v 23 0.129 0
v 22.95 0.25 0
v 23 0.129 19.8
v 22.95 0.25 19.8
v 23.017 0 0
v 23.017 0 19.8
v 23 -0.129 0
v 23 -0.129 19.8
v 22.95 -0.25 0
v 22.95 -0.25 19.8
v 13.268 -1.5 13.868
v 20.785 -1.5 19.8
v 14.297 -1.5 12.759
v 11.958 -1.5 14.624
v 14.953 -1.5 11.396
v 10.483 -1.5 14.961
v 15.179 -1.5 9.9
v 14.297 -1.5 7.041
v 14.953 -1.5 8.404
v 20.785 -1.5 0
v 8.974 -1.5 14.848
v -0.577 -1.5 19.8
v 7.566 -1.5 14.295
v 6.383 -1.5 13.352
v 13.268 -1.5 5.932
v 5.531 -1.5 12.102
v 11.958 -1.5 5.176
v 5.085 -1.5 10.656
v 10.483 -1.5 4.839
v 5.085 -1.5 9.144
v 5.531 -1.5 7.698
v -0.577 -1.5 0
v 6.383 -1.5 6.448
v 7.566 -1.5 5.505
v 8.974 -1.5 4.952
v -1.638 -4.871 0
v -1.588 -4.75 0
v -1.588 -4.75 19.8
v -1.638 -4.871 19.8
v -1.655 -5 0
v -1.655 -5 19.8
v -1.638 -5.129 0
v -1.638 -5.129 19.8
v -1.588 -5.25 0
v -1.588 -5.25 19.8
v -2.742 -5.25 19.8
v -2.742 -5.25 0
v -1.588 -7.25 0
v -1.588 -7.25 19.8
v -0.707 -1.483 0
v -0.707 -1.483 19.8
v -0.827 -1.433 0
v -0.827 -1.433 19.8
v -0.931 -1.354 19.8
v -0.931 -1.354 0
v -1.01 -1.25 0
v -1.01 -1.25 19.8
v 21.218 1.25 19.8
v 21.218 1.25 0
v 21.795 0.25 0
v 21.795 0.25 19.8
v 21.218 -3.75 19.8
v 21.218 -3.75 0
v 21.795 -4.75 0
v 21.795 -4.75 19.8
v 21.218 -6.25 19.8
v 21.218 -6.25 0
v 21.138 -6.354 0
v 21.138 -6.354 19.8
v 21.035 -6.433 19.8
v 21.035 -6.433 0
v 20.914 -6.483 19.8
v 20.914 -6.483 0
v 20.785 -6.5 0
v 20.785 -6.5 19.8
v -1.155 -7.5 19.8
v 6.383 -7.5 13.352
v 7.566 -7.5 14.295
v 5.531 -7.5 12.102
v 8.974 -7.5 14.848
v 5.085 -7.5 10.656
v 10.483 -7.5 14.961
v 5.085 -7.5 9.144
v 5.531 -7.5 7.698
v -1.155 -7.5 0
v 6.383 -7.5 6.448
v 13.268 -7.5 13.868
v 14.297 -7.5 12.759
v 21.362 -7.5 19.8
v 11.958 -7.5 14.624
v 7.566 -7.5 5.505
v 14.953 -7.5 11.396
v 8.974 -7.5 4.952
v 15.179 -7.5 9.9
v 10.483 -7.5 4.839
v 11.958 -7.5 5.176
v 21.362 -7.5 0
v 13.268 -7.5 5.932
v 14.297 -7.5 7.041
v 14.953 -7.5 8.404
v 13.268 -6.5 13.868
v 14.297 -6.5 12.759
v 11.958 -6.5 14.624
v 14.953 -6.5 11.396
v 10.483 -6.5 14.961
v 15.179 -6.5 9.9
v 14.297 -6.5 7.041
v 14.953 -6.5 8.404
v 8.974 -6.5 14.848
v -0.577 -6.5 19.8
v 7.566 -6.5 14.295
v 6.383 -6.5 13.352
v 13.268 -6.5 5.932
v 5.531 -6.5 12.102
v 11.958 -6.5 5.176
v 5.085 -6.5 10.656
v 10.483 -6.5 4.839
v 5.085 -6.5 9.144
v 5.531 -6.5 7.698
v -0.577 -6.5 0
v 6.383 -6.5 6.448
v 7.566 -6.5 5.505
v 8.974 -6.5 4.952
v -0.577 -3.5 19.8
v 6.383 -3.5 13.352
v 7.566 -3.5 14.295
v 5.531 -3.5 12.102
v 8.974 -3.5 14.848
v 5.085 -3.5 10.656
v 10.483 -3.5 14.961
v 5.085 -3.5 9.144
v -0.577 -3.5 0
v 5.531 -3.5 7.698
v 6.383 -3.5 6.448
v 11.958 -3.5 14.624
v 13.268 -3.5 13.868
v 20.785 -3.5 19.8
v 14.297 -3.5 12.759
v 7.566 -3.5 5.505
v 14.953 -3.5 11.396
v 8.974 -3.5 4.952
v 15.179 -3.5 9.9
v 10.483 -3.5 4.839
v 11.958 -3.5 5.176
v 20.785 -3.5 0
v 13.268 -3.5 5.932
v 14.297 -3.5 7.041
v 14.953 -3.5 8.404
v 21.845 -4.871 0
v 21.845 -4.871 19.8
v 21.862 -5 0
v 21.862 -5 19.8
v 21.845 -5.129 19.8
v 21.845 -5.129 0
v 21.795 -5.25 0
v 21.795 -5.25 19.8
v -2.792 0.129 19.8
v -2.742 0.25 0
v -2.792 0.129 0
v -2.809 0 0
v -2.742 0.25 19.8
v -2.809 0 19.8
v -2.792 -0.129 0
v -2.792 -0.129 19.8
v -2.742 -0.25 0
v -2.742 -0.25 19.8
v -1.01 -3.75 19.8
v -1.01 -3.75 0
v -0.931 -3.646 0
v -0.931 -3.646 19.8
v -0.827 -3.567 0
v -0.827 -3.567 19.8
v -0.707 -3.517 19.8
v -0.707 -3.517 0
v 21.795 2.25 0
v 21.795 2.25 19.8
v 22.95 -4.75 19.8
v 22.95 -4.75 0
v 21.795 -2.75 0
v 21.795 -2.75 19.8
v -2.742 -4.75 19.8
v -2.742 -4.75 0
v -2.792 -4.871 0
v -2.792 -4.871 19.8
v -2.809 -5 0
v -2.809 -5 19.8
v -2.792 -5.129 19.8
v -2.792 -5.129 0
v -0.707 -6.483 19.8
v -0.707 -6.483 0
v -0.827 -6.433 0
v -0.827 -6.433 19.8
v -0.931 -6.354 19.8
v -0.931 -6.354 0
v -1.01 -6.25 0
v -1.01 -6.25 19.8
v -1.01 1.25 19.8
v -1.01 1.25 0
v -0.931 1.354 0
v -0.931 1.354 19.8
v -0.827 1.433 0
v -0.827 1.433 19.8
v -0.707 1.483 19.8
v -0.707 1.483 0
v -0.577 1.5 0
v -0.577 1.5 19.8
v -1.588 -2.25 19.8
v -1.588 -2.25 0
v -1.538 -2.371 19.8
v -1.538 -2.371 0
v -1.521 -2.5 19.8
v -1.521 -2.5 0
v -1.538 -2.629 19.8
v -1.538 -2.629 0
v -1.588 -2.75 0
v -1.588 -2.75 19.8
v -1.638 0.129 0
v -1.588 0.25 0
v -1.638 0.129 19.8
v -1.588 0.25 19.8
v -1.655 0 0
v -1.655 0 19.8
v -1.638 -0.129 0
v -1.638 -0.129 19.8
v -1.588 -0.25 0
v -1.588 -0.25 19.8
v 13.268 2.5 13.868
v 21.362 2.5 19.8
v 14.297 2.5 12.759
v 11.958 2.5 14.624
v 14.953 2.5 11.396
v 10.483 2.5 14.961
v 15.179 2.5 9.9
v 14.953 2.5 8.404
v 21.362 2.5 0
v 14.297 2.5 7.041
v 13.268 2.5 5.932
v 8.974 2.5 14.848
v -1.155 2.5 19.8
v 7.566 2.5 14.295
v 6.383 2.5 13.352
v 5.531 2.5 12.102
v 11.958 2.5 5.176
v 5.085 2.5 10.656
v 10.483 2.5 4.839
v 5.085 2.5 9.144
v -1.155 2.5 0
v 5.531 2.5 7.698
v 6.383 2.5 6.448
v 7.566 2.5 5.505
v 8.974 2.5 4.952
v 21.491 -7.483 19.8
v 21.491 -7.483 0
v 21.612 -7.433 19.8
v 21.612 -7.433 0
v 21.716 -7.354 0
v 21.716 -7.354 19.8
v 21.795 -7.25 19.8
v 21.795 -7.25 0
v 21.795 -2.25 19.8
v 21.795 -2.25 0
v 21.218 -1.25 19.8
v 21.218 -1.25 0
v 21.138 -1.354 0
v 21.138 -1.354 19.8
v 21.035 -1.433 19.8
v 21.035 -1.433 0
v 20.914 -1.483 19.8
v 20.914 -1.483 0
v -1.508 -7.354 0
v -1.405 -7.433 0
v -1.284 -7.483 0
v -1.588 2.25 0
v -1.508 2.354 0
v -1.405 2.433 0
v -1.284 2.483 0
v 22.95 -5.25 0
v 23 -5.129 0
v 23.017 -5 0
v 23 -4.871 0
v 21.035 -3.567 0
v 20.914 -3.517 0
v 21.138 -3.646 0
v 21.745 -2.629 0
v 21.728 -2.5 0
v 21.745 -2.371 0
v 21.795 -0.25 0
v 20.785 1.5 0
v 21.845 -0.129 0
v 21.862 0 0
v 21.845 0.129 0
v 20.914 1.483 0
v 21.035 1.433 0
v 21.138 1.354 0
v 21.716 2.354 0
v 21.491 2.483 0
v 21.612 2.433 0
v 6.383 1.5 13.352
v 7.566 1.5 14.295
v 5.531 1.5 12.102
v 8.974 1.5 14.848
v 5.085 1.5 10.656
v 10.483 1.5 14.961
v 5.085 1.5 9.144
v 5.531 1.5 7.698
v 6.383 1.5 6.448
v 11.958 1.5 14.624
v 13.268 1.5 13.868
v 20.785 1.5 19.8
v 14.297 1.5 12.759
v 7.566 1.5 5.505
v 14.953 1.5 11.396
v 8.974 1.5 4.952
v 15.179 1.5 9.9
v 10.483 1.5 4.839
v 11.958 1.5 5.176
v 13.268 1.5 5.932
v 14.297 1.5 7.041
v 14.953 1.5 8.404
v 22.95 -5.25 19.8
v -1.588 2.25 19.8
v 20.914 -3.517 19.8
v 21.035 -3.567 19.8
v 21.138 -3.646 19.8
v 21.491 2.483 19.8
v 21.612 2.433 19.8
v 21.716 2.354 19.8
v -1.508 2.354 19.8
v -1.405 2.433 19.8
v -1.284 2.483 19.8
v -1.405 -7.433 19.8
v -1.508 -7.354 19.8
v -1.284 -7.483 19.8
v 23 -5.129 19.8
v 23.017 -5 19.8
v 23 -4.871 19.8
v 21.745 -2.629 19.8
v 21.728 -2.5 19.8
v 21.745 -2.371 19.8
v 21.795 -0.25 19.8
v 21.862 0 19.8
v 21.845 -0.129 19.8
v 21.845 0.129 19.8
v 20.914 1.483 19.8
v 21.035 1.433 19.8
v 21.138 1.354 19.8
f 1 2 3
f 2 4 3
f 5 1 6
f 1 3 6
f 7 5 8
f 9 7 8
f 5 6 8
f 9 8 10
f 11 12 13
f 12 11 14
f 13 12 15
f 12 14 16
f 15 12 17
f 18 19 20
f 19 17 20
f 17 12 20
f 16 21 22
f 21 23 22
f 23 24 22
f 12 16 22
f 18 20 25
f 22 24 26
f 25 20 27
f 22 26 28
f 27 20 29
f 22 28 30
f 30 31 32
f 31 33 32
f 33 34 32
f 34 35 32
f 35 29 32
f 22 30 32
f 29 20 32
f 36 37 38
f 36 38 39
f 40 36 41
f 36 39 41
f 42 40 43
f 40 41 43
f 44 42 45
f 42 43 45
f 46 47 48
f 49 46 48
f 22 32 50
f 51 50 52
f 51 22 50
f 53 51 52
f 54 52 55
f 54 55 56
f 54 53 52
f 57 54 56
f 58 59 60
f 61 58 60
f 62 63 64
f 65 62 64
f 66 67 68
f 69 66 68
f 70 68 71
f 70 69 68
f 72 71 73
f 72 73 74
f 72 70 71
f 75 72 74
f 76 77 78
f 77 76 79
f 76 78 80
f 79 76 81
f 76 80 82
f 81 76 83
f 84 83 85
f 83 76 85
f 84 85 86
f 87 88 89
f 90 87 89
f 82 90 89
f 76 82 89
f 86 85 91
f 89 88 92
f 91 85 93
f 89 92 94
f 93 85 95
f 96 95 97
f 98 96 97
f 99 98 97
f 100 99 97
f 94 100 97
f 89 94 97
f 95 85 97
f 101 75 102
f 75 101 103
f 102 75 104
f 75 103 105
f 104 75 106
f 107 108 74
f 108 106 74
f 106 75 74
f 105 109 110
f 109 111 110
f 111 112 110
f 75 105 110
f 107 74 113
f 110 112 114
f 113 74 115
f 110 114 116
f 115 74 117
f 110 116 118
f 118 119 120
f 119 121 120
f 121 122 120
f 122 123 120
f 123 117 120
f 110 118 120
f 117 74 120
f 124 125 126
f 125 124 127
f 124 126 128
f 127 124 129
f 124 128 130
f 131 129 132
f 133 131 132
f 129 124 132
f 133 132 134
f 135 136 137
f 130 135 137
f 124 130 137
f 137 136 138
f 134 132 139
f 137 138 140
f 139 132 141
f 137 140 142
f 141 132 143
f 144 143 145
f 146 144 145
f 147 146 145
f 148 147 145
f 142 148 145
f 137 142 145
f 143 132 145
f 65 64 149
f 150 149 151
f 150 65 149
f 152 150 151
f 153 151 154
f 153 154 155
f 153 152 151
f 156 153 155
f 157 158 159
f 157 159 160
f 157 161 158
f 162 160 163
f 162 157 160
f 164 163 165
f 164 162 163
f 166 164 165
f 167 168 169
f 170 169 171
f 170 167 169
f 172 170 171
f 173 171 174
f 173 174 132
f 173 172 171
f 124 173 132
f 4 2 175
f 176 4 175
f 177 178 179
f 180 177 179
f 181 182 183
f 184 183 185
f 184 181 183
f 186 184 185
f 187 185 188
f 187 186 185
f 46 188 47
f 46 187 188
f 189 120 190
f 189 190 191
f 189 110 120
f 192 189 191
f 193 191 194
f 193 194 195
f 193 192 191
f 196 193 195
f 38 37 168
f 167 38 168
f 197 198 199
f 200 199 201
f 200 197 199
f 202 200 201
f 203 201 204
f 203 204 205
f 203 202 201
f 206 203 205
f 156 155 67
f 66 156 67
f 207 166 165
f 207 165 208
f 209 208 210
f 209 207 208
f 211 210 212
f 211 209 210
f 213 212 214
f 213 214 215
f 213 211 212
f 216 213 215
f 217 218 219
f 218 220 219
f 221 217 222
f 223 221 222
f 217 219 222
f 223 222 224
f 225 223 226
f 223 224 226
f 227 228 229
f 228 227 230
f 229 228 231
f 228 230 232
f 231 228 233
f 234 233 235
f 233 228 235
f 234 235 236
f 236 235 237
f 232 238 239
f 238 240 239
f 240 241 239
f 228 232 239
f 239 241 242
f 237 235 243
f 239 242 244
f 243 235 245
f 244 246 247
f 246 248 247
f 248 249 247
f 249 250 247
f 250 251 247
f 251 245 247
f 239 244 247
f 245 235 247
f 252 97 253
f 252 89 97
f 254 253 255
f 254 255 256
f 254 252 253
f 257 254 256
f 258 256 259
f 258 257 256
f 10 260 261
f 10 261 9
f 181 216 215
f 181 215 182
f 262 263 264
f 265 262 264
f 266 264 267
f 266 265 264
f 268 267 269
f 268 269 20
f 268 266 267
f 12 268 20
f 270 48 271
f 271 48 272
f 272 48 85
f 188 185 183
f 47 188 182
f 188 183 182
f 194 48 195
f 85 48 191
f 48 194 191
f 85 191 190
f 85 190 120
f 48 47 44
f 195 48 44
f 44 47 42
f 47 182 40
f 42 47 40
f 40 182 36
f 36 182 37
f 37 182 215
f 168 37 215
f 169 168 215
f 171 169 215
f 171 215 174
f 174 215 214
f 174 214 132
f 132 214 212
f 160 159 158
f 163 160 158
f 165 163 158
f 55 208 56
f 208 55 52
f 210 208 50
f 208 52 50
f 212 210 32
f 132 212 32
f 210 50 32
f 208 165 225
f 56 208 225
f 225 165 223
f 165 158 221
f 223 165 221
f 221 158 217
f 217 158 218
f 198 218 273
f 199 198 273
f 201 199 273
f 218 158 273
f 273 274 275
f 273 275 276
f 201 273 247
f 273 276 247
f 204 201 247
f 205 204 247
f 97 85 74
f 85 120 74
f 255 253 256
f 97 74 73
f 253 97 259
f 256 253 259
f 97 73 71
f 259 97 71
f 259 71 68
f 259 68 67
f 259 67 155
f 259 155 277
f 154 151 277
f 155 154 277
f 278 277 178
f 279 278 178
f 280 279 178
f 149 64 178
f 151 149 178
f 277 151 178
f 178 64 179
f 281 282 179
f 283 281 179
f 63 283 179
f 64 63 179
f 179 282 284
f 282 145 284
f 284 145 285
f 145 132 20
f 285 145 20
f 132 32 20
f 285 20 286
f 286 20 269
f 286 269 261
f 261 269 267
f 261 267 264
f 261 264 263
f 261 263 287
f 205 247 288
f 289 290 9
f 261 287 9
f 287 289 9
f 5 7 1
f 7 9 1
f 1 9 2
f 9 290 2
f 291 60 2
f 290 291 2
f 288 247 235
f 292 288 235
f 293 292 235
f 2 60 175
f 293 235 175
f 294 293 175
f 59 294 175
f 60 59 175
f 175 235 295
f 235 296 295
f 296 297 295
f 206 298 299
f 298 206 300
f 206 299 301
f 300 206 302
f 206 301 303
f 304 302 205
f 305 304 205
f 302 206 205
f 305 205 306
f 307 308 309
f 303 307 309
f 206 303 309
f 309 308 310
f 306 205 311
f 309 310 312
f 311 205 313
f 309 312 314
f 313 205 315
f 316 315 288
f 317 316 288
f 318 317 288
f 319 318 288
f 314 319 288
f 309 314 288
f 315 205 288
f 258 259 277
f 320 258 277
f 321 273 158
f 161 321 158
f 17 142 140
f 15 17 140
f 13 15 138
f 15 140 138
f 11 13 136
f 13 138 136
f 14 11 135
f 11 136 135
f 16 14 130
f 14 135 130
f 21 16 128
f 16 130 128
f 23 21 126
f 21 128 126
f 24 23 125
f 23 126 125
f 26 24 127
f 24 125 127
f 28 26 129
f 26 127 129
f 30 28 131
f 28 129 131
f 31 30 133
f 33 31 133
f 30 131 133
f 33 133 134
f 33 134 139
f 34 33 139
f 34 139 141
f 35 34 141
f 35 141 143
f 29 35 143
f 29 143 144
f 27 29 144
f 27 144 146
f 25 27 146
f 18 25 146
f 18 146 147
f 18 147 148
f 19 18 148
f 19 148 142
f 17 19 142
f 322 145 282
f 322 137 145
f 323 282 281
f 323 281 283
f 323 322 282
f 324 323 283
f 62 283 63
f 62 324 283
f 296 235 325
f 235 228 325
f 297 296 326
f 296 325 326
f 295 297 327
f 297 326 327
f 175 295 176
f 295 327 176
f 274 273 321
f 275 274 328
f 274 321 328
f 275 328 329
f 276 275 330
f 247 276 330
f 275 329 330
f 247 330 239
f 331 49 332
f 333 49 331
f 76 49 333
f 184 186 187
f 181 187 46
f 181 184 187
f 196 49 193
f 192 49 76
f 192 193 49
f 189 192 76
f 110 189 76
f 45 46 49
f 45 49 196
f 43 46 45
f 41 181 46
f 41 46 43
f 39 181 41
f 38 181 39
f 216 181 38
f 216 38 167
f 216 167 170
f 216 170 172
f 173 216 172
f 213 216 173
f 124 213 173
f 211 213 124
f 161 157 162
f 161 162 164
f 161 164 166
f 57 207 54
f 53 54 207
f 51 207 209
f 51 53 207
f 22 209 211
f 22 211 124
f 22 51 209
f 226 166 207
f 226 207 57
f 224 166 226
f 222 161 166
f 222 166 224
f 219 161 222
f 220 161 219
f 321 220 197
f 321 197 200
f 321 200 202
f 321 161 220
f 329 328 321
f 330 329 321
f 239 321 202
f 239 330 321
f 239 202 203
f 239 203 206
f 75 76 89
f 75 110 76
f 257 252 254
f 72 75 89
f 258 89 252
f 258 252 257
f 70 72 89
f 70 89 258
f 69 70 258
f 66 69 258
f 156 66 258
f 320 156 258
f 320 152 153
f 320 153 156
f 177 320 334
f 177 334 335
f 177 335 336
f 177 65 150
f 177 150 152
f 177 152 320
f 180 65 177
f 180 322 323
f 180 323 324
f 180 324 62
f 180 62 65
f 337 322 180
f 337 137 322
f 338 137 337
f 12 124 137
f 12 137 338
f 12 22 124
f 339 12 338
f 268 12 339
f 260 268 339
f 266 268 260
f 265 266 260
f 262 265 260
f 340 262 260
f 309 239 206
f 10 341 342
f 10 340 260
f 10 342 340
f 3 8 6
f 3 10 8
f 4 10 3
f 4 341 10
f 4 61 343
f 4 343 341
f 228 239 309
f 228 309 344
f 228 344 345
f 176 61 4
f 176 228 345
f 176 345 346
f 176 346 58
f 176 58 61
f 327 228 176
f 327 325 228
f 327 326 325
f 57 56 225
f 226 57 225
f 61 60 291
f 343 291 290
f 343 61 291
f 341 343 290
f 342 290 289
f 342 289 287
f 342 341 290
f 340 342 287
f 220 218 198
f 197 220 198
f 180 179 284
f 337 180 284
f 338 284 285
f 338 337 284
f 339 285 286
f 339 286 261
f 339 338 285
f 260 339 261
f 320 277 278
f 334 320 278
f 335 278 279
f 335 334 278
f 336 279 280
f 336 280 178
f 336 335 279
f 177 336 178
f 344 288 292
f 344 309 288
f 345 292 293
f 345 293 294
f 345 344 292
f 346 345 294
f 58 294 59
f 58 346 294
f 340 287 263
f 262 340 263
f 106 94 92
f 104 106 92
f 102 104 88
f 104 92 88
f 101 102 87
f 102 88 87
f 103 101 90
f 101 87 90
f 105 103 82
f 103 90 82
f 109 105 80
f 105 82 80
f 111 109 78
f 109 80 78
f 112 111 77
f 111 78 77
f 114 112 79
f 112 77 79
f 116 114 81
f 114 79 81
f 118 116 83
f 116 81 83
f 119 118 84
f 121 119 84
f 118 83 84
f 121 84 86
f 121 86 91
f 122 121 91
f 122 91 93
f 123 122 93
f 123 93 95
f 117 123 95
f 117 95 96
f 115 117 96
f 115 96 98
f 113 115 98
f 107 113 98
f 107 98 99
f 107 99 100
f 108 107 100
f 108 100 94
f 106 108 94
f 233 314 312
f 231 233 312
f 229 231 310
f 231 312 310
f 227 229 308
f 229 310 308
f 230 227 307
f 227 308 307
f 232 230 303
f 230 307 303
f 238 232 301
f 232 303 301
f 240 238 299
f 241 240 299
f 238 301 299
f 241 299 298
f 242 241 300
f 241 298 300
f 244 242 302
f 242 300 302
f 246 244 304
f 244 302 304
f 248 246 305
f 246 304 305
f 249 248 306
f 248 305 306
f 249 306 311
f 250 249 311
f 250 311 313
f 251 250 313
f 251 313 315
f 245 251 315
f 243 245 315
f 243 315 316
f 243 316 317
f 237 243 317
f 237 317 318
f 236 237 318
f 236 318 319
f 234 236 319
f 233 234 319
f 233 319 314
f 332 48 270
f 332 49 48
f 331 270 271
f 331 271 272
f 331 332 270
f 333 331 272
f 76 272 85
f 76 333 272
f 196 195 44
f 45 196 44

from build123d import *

# Parameters (mm, degrees)
BOSS_EXTRUDE5_DEPTH = 19.8
SKETCH6_R           = 5.075
CUT_EXTRUDE1_DEPTH  = 10
FILLET2_R           = 0.5


with BuildPart() as part:
    # Sketch5 → Boss-Extrude5 (new body)
    with BuildSketch(Plane.XY):
        Polygon((4.330127019, 2.5), (1.443375673, 2.5), (-1.443375673, 2.5), (-2.886751346, 0), (-1.443375673, -2.5), (-2.886751346, -5), (-1.443375673, -7.5), (1.443375673, -7.5), (4.330127019, -7.5), (7.216878365, -7.5), (10.103629711, -7.5), (12.990381057, -7.5), (15.877132403, -7.5), (18.763883749, -7.5), (21.650635095, -7.5), (23.094010768, -5), (21.650635095, -2.5), (23.094010768, 0), (21.650635095, 2.5), (18.763883749, 2.5), (15.877132403, 2.5), (12.990381057, 2.5), (10.103629711, 2.5), (7.216878365, 2.5), align=None)
        Polygon((-0.866025404, -3.5), (0.866025404, -3.5), (2.020725942, -3.5), (19.341234018, -3.5), (21.073284825, -3.5), (21.939310229, -5), (21.073284825, -6.5), (19.341234018, -6.5), (0.866025404, -6.5), (-0.866025404, -6.5), (-1.732050808, -5), align=None, mode=Mode.SUBTRACT)
        Polygon((-0.866025404, 1.5), (0.866025404, 1.5), (18.186533479, 1.5), (19.341234018, 1.5), (21.073284825, 1.5), (21.939310229, 0), (21.073284825, -1.5), (19.341234018, -1.5), (0.866025404, -1.5), (-0.866025404, -1.5), (-1.732050808, 0), align=None, mode=Mode.SUBTRACT)
    extrude(amount=BOSS_EXTRUDE5_DEPTH)

    # Sketch6 → Cut-Extrude1 (cut)
    with BuildSketch(Plane.XZ.offset(7.5)):
        with Locations((10.103629827, 9.9)):
            Circle(SKETCH6_R)
    extrude(amount=-CUT_EXTRUDE1_DEPTH, mode=Mode.SUBTRACT)

    # Fillet2
    fillet2_edges = [part.edges().sort_by_distance(p)[0] for p in [
        (21.073284825, -3.5, 9.9),
        (-0.866025404, -3.5, 9.9),
        (-1.732050808, -5, 9.9),
        (-0.866025404, -6.5, 9.9),
        (21.073284825, -6.5, 9.9),
        (21.939310229, -5, 9.9),
        (21.650635095, 2.5, 9.9),
        (23.094010768, 0, 9.9),
        (21.650635095, -2.5, 9.9),
        (23.094010768, -5, 9.9),
        (21.650635095, -7.5, 9.9),
        (-1.443375673, -7.5, 9.9),
        (-2.886751346, -5, 9.9),
        (-1.443375673, -2.5, 9.9),
        (-2.886751346, 0, 9.9),
        (-1.443375673, 2.5, 9.9),
        (21.073284825, 1.5, 9.9),
        (-0.866025404, 1.5, 9.9),
        (-1.732050808, 0, 9.9),
        (-0.866025404, -1.5, 9.9),
        (21.073284825, -1.5, 9.9),
        (21.939310229, 0, 9.9),
    ]]
    fillet(fillet2_edges, radius=FILLET2_R)


solid = part.part
